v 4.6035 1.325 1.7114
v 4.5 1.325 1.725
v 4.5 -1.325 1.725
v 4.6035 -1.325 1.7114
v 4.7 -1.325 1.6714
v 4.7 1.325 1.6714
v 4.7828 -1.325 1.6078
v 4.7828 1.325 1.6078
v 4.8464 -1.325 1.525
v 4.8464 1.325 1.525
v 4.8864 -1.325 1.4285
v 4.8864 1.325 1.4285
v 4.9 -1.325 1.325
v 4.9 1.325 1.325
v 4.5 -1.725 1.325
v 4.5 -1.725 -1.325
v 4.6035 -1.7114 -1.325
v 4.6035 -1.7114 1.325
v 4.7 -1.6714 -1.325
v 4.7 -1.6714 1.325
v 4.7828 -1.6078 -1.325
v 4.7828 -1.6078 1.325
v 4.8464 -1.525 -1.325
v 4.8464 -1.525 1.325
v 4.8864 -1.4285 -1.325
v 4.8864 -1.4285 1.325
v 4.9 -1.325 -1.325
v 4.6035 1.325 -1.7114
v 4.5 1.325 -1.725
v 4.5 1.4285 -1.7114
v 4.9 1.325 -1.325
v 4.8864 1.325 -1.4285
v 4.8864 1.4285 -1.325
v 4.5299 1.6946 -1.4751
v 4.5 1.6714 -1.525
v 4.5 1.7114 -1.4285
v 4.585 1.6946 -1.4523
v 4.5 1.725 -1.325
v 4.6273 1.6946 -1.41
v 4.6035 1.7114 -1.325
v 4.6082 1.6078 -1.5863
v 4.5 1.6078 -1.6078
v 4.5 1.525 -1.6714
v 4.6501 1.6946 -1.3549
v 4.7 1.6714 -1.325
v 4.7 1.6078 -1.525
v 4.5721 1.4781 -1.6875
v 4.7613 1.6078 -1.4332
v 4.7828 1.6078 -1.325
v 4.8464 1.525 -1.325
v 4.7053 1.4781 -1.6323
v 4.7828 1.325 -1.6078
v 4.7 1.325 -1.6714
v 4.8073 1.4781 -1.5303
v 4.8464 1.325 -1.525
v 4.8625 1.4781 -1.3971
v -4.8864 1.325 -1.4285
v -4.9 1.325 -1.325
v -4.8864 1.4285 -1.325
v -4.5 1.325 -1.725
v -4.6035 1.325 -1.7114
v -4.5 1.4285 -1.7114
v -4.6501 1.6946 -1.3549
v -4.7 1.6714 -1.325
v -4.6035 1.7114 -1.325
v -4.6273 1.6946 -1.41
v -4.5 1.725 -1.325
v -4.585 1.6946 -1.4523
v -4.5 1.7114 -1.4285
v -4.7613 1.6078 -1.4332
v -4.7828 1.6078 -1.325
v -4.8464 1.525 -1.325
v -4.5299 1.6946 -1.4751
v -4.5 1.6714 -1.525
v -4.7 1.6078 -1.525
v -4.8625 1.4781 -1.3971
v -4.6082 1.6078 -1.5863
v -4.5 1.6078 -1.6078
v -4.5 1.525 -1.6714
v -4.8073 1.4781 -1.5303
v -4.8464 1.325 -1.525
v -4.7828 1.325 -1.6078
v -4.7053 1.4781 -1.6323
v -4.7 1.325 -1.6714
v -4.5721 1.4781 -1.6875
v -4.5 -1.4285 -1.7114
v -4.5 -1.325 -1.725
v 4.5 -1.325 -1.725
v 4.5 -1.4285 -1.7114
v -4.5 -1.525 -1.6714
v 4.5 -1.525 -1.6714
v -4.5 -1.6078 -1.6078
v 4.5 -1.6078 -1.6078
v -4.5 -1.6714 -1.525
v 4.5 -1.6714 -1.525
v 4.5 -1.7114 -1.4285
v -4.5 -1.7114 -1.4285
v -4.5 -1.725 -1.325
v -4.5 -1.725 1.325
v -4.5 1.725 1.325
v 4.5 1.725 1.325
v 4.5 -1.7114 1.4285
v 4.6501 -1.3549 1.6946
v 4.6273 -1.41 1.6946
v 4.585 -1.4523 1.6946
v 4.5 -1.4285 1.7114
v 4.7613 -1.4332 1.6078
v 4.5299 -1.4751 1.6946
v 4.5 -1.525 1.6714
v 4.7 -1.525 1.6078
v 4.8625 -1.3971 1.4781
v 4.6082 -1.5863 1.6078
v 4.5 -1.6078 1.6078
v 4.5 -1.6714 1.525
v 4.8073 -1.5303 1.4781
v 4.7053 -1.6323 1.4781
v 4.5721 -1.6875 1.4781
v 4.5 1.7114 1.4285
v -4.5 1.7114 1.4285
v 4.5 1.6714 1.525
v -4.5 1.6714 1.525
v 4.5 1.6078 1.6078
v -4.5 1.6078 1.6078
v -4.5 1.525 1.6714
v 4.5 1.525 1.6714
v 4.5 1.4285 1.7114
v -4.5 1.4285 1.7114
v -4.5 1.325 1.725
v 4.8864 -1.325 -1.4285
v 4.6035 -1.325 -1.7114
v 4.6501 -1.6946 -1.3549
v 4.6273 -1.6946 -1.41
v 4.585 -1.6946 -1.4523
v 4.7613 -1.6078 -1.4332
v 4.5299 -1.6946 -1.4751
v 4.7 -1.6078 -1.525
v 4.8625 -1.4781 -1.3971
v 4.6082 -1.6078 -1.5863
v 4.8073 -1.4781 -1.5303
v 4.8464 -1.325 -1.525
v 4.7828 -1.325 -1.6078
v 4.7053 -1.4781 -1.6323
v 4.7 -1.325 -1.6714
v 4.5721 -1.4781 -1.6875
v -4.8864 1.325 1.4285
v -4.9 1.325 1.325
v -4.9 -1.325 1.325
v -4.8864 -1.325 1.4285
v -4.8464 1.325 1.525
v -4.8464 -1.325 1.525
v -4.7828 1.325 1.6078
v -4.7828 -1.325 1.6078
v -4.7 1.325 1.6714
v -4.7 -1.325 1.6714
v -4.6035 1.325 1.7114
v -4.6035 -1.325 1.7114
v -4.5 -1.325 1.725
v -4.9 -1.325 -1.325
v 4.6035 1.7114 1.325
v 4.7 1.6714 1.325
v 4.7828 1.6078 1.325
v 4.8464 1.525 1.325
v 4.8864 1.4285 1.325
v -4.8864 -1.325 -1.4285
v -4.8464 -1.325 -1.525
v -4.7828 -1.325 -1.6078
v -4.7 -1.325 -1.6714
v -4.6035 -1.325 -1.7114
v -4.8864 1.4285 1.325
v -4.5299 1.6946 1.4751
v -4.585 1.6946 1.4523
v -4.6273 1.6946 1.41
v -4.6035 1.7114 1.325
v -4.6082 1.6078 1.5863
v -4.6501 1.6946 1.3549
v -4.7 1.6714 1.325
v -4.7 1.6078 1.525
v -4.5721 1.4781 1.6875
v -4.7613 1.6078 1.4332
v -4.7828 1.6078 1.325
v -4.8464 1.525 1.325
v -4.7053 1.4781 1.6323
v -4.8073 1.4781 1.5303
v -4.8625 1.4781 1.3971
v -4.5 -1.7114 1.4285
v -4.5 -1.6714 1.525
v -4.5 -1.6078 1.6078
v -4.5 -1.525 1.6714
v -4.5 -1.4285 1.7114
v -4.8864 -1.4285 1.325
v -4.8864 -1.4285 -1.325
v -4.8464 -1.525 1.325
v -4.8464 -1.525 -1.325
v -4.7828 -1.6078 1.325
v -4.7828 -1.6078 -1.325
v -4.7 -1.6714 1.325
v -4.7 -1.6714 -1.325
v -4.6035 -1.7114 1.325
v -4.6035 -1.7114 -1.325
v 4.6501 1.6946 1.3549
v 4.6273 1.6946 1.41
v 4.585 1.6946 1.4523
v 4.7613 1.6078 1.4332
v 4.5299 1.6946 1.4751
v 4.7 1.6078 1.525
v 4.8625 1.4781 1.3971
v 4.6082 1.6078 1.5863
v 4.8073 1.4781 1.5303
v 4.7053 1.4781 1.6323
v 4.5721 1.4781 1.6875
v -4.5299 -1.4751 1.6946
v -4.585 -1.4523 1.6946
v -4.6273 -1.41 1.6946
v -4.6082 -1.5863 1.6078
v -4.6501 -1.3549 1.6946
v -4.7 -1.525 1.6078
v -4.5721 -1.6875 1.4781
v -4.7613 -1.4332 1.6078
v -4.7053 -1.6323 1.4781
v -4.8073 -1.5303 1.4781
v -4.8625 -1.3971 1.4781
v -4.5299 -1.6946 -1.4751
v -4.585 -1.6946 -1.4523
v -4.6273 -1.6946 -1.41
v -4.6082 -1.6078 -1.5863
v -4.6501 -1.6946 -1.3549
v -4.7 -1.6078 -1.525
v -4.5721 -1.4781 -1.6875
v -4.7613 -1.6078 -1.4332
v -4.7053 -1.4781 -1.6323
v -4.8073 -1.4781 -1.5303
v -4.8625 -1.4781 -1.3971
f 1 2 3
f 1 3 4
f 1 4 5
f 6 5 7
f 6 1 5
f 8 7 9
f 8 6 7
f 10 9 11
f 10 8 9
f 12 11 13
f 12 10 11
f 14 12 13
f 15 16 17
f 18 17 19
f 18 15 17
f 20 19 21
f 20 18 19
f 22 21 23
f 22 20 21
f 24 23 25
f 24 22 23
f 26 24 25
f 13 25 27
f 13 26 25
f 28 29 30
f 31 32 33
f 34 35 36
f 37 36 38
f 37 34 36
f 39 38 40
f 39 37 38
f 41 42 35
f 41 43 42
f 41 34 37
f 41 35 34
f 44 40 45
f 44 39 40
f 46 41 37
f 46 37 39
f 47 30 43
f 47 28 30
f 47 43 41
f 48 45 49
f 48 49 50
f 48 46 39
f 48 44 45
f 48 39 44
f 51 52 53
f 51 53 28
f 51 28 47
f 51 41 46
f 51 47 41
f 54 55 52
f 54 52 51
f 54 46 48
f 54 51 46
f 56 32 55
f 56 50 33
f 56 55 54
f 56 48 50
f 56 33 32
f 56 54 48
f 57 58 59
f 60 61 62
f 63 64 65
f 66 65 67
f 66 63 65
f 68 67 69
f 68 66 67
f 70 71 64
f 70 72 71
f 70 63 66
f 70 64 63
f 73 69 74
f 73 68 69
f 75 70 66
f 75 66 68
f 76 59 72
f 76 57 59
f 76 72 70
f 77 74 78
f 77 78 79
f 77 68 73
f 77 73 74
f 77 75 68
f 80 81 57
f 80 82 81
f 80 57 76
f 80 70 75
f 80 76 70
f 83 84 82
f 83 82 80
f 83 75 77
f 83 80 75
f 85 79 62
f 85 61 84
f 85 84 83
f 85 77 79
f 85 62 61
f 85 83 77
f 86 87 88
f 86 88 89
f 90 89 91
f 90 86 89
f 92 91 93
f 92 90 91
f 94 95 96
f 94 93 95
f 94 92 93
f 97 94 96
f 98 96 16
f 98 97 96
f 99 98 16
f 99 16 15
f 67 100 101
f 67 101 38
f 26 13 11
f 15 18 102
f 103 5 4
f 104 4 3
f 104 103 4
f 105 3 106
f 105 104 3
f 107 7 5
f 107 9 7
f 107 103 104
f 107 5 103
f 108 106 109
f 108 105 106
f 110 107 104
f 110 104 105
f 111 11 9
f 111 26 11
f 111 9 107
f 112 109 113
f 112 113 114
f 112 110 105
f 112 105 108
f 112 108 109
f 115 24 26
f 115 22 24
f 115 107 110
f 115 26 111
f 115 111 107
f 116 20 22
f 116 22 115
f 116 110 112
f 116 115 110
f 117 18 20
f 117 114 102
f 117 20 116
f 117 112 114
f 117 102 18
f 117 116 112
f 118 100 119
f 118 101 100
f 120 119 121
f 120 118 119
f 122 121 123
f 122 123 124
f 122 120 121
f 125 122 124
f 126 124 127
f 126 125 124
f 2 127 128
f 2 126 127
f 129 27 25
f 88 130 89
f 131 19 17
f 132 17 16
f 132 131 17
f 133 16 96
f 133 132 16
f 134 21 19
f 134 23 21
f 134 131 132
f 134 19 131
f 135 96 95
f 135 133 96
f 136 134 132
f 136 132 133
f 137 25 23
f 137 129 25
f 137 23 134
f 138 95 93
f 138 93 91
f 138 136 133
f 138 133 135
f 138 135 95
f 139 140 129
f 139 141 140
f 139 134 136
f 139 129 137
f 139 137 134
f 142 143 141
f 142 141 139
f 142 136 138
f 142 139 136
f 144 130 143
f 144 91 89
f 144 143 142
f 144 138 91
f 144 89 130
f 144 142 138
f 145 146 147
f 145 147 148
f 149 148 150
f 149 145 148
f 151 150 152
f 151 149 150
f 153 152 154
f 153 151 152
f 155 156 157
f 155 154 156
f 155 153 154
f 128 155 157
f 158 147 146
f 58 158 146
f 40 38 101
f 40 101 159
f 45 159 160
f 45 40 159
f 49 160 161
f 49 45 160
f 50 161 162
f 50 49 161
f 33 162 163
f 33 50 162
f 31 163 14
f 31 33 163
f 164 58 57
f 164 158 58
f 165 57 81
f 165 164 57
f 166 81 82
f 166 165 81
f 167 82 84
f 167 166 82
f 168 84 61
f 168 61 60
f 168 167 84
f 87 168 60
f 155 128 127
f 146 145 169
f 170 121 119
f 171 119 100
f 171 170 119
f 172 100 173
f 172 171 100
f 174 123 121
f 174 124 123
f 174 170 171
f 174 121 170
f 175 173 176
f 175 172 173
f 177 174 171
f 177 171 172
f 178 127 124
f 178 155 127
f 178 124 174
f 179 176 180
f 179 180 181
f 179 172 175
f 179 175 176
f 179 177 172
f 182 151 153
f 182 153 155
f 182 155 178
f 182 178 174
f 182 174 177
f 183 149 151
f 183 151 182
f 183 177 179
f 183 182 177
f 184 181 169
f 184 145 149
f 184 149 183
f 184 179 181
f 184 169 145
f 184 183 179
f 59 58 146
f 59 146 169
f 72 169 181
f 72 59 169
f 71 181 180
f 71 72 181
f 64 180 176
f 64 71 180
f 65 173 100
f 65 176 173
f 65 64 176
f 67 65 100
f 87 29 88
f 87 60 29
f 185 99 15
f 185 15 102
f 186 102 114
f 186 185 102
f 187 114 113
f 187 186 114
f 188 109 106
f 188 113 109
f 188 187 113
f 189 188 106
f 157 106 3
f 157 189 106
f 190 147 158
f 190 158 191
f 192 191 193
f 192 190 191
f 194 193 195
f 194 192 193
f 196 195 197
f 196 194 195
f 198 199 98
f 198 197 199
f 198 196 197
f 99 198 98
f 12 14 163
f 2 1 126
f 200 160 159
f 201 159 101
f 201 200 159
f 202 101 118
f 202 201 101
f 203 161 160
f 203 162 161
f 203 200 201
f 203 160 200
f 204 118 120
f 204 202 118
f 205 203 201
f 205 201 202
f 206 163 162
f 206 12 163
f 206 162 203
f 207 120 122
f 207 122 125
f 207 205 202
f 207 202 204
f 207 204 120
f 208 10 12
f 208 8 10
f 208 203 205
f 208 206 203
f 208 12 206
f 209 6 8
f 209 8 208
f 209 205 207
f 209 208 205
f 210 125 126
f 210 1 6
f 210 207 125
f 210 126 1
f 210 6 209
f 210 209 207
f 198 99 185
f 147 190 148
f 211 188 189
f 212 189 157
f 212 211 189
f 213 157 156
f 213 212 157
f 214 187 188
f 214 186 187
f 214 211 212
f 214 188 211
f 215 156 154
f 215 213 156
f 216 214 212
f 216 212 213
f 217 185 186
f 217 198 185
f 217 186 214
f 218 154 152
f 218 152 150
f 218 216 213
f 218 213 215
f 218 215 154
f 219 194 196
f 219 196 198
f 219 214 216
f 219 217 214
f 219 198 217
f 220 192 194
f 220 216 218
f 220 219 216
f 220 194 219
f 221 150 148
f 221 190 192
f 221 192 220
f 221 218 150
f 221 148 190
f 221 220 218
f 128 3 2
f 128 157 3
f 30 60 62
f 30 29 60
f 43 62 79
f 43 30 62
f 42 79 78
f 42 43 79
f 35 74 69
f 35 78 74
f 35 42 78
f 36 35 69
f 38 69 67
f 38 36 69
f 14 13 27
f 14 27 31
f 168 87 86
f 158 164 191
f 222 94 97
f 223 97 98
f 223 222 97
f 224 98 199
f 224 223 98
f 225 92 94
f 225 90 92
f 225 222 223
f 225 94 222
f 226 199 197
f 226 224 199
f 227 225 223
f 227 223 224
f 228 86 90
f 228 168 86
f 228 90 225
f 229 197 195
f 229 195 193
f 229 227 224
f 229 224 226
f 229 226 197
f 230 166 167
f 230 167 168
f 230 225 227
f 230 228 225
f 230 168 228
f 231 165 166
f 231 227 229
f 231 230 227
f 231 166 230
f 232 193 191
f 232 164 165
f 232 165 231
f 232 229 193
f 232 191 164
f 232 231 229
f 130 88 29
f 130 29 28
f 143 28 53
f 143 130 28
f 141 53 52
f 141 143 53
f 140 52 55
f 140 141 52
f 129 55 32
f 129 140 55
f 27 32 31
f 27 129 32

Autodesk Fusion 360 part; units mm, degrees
sketch "Sketch1" plane through (0, 0, 0) normal (1, 0, 0) x (0, 1, 0)
  line L0 (1.725, -1.725) -> (-1.725, -1.725)
  line L1 (-1.725, -1.725) -> (-1.725, 1.725)
  line L2 (-1.725, 1.725) -> (1.725, 1.725)
  line L3 (1.725, 1.725) -> (1.725, -1.725)
  line L4 (1.725, -1.725) -> (-1.725, 1.725) construction
  line L5 (-1.725, -1.725) -> (1.725, 1.725) construction
  dimension "d10" = 3.45
  dimension "d11" = 3.45
extrude "Extrude1" add sketch "Sketch1" along normal blind 4.9
extrude "Extrude2" add 1 faces at (0, -0.575, 0.575) along direction (-1, 0, 0) blind 4.9
fillet "Fillet1" radius 0.4 6 faces at (4.9, -0.575, 0.575) (-4.9, -0.575, 0.575) (1.6333, -0.575, 1.725) (1.6333, -1.725, -0.575) (1.6333, 1.725, 0.575) (1.6333, 0.575, -1.725)
equation "d11 = d10"
